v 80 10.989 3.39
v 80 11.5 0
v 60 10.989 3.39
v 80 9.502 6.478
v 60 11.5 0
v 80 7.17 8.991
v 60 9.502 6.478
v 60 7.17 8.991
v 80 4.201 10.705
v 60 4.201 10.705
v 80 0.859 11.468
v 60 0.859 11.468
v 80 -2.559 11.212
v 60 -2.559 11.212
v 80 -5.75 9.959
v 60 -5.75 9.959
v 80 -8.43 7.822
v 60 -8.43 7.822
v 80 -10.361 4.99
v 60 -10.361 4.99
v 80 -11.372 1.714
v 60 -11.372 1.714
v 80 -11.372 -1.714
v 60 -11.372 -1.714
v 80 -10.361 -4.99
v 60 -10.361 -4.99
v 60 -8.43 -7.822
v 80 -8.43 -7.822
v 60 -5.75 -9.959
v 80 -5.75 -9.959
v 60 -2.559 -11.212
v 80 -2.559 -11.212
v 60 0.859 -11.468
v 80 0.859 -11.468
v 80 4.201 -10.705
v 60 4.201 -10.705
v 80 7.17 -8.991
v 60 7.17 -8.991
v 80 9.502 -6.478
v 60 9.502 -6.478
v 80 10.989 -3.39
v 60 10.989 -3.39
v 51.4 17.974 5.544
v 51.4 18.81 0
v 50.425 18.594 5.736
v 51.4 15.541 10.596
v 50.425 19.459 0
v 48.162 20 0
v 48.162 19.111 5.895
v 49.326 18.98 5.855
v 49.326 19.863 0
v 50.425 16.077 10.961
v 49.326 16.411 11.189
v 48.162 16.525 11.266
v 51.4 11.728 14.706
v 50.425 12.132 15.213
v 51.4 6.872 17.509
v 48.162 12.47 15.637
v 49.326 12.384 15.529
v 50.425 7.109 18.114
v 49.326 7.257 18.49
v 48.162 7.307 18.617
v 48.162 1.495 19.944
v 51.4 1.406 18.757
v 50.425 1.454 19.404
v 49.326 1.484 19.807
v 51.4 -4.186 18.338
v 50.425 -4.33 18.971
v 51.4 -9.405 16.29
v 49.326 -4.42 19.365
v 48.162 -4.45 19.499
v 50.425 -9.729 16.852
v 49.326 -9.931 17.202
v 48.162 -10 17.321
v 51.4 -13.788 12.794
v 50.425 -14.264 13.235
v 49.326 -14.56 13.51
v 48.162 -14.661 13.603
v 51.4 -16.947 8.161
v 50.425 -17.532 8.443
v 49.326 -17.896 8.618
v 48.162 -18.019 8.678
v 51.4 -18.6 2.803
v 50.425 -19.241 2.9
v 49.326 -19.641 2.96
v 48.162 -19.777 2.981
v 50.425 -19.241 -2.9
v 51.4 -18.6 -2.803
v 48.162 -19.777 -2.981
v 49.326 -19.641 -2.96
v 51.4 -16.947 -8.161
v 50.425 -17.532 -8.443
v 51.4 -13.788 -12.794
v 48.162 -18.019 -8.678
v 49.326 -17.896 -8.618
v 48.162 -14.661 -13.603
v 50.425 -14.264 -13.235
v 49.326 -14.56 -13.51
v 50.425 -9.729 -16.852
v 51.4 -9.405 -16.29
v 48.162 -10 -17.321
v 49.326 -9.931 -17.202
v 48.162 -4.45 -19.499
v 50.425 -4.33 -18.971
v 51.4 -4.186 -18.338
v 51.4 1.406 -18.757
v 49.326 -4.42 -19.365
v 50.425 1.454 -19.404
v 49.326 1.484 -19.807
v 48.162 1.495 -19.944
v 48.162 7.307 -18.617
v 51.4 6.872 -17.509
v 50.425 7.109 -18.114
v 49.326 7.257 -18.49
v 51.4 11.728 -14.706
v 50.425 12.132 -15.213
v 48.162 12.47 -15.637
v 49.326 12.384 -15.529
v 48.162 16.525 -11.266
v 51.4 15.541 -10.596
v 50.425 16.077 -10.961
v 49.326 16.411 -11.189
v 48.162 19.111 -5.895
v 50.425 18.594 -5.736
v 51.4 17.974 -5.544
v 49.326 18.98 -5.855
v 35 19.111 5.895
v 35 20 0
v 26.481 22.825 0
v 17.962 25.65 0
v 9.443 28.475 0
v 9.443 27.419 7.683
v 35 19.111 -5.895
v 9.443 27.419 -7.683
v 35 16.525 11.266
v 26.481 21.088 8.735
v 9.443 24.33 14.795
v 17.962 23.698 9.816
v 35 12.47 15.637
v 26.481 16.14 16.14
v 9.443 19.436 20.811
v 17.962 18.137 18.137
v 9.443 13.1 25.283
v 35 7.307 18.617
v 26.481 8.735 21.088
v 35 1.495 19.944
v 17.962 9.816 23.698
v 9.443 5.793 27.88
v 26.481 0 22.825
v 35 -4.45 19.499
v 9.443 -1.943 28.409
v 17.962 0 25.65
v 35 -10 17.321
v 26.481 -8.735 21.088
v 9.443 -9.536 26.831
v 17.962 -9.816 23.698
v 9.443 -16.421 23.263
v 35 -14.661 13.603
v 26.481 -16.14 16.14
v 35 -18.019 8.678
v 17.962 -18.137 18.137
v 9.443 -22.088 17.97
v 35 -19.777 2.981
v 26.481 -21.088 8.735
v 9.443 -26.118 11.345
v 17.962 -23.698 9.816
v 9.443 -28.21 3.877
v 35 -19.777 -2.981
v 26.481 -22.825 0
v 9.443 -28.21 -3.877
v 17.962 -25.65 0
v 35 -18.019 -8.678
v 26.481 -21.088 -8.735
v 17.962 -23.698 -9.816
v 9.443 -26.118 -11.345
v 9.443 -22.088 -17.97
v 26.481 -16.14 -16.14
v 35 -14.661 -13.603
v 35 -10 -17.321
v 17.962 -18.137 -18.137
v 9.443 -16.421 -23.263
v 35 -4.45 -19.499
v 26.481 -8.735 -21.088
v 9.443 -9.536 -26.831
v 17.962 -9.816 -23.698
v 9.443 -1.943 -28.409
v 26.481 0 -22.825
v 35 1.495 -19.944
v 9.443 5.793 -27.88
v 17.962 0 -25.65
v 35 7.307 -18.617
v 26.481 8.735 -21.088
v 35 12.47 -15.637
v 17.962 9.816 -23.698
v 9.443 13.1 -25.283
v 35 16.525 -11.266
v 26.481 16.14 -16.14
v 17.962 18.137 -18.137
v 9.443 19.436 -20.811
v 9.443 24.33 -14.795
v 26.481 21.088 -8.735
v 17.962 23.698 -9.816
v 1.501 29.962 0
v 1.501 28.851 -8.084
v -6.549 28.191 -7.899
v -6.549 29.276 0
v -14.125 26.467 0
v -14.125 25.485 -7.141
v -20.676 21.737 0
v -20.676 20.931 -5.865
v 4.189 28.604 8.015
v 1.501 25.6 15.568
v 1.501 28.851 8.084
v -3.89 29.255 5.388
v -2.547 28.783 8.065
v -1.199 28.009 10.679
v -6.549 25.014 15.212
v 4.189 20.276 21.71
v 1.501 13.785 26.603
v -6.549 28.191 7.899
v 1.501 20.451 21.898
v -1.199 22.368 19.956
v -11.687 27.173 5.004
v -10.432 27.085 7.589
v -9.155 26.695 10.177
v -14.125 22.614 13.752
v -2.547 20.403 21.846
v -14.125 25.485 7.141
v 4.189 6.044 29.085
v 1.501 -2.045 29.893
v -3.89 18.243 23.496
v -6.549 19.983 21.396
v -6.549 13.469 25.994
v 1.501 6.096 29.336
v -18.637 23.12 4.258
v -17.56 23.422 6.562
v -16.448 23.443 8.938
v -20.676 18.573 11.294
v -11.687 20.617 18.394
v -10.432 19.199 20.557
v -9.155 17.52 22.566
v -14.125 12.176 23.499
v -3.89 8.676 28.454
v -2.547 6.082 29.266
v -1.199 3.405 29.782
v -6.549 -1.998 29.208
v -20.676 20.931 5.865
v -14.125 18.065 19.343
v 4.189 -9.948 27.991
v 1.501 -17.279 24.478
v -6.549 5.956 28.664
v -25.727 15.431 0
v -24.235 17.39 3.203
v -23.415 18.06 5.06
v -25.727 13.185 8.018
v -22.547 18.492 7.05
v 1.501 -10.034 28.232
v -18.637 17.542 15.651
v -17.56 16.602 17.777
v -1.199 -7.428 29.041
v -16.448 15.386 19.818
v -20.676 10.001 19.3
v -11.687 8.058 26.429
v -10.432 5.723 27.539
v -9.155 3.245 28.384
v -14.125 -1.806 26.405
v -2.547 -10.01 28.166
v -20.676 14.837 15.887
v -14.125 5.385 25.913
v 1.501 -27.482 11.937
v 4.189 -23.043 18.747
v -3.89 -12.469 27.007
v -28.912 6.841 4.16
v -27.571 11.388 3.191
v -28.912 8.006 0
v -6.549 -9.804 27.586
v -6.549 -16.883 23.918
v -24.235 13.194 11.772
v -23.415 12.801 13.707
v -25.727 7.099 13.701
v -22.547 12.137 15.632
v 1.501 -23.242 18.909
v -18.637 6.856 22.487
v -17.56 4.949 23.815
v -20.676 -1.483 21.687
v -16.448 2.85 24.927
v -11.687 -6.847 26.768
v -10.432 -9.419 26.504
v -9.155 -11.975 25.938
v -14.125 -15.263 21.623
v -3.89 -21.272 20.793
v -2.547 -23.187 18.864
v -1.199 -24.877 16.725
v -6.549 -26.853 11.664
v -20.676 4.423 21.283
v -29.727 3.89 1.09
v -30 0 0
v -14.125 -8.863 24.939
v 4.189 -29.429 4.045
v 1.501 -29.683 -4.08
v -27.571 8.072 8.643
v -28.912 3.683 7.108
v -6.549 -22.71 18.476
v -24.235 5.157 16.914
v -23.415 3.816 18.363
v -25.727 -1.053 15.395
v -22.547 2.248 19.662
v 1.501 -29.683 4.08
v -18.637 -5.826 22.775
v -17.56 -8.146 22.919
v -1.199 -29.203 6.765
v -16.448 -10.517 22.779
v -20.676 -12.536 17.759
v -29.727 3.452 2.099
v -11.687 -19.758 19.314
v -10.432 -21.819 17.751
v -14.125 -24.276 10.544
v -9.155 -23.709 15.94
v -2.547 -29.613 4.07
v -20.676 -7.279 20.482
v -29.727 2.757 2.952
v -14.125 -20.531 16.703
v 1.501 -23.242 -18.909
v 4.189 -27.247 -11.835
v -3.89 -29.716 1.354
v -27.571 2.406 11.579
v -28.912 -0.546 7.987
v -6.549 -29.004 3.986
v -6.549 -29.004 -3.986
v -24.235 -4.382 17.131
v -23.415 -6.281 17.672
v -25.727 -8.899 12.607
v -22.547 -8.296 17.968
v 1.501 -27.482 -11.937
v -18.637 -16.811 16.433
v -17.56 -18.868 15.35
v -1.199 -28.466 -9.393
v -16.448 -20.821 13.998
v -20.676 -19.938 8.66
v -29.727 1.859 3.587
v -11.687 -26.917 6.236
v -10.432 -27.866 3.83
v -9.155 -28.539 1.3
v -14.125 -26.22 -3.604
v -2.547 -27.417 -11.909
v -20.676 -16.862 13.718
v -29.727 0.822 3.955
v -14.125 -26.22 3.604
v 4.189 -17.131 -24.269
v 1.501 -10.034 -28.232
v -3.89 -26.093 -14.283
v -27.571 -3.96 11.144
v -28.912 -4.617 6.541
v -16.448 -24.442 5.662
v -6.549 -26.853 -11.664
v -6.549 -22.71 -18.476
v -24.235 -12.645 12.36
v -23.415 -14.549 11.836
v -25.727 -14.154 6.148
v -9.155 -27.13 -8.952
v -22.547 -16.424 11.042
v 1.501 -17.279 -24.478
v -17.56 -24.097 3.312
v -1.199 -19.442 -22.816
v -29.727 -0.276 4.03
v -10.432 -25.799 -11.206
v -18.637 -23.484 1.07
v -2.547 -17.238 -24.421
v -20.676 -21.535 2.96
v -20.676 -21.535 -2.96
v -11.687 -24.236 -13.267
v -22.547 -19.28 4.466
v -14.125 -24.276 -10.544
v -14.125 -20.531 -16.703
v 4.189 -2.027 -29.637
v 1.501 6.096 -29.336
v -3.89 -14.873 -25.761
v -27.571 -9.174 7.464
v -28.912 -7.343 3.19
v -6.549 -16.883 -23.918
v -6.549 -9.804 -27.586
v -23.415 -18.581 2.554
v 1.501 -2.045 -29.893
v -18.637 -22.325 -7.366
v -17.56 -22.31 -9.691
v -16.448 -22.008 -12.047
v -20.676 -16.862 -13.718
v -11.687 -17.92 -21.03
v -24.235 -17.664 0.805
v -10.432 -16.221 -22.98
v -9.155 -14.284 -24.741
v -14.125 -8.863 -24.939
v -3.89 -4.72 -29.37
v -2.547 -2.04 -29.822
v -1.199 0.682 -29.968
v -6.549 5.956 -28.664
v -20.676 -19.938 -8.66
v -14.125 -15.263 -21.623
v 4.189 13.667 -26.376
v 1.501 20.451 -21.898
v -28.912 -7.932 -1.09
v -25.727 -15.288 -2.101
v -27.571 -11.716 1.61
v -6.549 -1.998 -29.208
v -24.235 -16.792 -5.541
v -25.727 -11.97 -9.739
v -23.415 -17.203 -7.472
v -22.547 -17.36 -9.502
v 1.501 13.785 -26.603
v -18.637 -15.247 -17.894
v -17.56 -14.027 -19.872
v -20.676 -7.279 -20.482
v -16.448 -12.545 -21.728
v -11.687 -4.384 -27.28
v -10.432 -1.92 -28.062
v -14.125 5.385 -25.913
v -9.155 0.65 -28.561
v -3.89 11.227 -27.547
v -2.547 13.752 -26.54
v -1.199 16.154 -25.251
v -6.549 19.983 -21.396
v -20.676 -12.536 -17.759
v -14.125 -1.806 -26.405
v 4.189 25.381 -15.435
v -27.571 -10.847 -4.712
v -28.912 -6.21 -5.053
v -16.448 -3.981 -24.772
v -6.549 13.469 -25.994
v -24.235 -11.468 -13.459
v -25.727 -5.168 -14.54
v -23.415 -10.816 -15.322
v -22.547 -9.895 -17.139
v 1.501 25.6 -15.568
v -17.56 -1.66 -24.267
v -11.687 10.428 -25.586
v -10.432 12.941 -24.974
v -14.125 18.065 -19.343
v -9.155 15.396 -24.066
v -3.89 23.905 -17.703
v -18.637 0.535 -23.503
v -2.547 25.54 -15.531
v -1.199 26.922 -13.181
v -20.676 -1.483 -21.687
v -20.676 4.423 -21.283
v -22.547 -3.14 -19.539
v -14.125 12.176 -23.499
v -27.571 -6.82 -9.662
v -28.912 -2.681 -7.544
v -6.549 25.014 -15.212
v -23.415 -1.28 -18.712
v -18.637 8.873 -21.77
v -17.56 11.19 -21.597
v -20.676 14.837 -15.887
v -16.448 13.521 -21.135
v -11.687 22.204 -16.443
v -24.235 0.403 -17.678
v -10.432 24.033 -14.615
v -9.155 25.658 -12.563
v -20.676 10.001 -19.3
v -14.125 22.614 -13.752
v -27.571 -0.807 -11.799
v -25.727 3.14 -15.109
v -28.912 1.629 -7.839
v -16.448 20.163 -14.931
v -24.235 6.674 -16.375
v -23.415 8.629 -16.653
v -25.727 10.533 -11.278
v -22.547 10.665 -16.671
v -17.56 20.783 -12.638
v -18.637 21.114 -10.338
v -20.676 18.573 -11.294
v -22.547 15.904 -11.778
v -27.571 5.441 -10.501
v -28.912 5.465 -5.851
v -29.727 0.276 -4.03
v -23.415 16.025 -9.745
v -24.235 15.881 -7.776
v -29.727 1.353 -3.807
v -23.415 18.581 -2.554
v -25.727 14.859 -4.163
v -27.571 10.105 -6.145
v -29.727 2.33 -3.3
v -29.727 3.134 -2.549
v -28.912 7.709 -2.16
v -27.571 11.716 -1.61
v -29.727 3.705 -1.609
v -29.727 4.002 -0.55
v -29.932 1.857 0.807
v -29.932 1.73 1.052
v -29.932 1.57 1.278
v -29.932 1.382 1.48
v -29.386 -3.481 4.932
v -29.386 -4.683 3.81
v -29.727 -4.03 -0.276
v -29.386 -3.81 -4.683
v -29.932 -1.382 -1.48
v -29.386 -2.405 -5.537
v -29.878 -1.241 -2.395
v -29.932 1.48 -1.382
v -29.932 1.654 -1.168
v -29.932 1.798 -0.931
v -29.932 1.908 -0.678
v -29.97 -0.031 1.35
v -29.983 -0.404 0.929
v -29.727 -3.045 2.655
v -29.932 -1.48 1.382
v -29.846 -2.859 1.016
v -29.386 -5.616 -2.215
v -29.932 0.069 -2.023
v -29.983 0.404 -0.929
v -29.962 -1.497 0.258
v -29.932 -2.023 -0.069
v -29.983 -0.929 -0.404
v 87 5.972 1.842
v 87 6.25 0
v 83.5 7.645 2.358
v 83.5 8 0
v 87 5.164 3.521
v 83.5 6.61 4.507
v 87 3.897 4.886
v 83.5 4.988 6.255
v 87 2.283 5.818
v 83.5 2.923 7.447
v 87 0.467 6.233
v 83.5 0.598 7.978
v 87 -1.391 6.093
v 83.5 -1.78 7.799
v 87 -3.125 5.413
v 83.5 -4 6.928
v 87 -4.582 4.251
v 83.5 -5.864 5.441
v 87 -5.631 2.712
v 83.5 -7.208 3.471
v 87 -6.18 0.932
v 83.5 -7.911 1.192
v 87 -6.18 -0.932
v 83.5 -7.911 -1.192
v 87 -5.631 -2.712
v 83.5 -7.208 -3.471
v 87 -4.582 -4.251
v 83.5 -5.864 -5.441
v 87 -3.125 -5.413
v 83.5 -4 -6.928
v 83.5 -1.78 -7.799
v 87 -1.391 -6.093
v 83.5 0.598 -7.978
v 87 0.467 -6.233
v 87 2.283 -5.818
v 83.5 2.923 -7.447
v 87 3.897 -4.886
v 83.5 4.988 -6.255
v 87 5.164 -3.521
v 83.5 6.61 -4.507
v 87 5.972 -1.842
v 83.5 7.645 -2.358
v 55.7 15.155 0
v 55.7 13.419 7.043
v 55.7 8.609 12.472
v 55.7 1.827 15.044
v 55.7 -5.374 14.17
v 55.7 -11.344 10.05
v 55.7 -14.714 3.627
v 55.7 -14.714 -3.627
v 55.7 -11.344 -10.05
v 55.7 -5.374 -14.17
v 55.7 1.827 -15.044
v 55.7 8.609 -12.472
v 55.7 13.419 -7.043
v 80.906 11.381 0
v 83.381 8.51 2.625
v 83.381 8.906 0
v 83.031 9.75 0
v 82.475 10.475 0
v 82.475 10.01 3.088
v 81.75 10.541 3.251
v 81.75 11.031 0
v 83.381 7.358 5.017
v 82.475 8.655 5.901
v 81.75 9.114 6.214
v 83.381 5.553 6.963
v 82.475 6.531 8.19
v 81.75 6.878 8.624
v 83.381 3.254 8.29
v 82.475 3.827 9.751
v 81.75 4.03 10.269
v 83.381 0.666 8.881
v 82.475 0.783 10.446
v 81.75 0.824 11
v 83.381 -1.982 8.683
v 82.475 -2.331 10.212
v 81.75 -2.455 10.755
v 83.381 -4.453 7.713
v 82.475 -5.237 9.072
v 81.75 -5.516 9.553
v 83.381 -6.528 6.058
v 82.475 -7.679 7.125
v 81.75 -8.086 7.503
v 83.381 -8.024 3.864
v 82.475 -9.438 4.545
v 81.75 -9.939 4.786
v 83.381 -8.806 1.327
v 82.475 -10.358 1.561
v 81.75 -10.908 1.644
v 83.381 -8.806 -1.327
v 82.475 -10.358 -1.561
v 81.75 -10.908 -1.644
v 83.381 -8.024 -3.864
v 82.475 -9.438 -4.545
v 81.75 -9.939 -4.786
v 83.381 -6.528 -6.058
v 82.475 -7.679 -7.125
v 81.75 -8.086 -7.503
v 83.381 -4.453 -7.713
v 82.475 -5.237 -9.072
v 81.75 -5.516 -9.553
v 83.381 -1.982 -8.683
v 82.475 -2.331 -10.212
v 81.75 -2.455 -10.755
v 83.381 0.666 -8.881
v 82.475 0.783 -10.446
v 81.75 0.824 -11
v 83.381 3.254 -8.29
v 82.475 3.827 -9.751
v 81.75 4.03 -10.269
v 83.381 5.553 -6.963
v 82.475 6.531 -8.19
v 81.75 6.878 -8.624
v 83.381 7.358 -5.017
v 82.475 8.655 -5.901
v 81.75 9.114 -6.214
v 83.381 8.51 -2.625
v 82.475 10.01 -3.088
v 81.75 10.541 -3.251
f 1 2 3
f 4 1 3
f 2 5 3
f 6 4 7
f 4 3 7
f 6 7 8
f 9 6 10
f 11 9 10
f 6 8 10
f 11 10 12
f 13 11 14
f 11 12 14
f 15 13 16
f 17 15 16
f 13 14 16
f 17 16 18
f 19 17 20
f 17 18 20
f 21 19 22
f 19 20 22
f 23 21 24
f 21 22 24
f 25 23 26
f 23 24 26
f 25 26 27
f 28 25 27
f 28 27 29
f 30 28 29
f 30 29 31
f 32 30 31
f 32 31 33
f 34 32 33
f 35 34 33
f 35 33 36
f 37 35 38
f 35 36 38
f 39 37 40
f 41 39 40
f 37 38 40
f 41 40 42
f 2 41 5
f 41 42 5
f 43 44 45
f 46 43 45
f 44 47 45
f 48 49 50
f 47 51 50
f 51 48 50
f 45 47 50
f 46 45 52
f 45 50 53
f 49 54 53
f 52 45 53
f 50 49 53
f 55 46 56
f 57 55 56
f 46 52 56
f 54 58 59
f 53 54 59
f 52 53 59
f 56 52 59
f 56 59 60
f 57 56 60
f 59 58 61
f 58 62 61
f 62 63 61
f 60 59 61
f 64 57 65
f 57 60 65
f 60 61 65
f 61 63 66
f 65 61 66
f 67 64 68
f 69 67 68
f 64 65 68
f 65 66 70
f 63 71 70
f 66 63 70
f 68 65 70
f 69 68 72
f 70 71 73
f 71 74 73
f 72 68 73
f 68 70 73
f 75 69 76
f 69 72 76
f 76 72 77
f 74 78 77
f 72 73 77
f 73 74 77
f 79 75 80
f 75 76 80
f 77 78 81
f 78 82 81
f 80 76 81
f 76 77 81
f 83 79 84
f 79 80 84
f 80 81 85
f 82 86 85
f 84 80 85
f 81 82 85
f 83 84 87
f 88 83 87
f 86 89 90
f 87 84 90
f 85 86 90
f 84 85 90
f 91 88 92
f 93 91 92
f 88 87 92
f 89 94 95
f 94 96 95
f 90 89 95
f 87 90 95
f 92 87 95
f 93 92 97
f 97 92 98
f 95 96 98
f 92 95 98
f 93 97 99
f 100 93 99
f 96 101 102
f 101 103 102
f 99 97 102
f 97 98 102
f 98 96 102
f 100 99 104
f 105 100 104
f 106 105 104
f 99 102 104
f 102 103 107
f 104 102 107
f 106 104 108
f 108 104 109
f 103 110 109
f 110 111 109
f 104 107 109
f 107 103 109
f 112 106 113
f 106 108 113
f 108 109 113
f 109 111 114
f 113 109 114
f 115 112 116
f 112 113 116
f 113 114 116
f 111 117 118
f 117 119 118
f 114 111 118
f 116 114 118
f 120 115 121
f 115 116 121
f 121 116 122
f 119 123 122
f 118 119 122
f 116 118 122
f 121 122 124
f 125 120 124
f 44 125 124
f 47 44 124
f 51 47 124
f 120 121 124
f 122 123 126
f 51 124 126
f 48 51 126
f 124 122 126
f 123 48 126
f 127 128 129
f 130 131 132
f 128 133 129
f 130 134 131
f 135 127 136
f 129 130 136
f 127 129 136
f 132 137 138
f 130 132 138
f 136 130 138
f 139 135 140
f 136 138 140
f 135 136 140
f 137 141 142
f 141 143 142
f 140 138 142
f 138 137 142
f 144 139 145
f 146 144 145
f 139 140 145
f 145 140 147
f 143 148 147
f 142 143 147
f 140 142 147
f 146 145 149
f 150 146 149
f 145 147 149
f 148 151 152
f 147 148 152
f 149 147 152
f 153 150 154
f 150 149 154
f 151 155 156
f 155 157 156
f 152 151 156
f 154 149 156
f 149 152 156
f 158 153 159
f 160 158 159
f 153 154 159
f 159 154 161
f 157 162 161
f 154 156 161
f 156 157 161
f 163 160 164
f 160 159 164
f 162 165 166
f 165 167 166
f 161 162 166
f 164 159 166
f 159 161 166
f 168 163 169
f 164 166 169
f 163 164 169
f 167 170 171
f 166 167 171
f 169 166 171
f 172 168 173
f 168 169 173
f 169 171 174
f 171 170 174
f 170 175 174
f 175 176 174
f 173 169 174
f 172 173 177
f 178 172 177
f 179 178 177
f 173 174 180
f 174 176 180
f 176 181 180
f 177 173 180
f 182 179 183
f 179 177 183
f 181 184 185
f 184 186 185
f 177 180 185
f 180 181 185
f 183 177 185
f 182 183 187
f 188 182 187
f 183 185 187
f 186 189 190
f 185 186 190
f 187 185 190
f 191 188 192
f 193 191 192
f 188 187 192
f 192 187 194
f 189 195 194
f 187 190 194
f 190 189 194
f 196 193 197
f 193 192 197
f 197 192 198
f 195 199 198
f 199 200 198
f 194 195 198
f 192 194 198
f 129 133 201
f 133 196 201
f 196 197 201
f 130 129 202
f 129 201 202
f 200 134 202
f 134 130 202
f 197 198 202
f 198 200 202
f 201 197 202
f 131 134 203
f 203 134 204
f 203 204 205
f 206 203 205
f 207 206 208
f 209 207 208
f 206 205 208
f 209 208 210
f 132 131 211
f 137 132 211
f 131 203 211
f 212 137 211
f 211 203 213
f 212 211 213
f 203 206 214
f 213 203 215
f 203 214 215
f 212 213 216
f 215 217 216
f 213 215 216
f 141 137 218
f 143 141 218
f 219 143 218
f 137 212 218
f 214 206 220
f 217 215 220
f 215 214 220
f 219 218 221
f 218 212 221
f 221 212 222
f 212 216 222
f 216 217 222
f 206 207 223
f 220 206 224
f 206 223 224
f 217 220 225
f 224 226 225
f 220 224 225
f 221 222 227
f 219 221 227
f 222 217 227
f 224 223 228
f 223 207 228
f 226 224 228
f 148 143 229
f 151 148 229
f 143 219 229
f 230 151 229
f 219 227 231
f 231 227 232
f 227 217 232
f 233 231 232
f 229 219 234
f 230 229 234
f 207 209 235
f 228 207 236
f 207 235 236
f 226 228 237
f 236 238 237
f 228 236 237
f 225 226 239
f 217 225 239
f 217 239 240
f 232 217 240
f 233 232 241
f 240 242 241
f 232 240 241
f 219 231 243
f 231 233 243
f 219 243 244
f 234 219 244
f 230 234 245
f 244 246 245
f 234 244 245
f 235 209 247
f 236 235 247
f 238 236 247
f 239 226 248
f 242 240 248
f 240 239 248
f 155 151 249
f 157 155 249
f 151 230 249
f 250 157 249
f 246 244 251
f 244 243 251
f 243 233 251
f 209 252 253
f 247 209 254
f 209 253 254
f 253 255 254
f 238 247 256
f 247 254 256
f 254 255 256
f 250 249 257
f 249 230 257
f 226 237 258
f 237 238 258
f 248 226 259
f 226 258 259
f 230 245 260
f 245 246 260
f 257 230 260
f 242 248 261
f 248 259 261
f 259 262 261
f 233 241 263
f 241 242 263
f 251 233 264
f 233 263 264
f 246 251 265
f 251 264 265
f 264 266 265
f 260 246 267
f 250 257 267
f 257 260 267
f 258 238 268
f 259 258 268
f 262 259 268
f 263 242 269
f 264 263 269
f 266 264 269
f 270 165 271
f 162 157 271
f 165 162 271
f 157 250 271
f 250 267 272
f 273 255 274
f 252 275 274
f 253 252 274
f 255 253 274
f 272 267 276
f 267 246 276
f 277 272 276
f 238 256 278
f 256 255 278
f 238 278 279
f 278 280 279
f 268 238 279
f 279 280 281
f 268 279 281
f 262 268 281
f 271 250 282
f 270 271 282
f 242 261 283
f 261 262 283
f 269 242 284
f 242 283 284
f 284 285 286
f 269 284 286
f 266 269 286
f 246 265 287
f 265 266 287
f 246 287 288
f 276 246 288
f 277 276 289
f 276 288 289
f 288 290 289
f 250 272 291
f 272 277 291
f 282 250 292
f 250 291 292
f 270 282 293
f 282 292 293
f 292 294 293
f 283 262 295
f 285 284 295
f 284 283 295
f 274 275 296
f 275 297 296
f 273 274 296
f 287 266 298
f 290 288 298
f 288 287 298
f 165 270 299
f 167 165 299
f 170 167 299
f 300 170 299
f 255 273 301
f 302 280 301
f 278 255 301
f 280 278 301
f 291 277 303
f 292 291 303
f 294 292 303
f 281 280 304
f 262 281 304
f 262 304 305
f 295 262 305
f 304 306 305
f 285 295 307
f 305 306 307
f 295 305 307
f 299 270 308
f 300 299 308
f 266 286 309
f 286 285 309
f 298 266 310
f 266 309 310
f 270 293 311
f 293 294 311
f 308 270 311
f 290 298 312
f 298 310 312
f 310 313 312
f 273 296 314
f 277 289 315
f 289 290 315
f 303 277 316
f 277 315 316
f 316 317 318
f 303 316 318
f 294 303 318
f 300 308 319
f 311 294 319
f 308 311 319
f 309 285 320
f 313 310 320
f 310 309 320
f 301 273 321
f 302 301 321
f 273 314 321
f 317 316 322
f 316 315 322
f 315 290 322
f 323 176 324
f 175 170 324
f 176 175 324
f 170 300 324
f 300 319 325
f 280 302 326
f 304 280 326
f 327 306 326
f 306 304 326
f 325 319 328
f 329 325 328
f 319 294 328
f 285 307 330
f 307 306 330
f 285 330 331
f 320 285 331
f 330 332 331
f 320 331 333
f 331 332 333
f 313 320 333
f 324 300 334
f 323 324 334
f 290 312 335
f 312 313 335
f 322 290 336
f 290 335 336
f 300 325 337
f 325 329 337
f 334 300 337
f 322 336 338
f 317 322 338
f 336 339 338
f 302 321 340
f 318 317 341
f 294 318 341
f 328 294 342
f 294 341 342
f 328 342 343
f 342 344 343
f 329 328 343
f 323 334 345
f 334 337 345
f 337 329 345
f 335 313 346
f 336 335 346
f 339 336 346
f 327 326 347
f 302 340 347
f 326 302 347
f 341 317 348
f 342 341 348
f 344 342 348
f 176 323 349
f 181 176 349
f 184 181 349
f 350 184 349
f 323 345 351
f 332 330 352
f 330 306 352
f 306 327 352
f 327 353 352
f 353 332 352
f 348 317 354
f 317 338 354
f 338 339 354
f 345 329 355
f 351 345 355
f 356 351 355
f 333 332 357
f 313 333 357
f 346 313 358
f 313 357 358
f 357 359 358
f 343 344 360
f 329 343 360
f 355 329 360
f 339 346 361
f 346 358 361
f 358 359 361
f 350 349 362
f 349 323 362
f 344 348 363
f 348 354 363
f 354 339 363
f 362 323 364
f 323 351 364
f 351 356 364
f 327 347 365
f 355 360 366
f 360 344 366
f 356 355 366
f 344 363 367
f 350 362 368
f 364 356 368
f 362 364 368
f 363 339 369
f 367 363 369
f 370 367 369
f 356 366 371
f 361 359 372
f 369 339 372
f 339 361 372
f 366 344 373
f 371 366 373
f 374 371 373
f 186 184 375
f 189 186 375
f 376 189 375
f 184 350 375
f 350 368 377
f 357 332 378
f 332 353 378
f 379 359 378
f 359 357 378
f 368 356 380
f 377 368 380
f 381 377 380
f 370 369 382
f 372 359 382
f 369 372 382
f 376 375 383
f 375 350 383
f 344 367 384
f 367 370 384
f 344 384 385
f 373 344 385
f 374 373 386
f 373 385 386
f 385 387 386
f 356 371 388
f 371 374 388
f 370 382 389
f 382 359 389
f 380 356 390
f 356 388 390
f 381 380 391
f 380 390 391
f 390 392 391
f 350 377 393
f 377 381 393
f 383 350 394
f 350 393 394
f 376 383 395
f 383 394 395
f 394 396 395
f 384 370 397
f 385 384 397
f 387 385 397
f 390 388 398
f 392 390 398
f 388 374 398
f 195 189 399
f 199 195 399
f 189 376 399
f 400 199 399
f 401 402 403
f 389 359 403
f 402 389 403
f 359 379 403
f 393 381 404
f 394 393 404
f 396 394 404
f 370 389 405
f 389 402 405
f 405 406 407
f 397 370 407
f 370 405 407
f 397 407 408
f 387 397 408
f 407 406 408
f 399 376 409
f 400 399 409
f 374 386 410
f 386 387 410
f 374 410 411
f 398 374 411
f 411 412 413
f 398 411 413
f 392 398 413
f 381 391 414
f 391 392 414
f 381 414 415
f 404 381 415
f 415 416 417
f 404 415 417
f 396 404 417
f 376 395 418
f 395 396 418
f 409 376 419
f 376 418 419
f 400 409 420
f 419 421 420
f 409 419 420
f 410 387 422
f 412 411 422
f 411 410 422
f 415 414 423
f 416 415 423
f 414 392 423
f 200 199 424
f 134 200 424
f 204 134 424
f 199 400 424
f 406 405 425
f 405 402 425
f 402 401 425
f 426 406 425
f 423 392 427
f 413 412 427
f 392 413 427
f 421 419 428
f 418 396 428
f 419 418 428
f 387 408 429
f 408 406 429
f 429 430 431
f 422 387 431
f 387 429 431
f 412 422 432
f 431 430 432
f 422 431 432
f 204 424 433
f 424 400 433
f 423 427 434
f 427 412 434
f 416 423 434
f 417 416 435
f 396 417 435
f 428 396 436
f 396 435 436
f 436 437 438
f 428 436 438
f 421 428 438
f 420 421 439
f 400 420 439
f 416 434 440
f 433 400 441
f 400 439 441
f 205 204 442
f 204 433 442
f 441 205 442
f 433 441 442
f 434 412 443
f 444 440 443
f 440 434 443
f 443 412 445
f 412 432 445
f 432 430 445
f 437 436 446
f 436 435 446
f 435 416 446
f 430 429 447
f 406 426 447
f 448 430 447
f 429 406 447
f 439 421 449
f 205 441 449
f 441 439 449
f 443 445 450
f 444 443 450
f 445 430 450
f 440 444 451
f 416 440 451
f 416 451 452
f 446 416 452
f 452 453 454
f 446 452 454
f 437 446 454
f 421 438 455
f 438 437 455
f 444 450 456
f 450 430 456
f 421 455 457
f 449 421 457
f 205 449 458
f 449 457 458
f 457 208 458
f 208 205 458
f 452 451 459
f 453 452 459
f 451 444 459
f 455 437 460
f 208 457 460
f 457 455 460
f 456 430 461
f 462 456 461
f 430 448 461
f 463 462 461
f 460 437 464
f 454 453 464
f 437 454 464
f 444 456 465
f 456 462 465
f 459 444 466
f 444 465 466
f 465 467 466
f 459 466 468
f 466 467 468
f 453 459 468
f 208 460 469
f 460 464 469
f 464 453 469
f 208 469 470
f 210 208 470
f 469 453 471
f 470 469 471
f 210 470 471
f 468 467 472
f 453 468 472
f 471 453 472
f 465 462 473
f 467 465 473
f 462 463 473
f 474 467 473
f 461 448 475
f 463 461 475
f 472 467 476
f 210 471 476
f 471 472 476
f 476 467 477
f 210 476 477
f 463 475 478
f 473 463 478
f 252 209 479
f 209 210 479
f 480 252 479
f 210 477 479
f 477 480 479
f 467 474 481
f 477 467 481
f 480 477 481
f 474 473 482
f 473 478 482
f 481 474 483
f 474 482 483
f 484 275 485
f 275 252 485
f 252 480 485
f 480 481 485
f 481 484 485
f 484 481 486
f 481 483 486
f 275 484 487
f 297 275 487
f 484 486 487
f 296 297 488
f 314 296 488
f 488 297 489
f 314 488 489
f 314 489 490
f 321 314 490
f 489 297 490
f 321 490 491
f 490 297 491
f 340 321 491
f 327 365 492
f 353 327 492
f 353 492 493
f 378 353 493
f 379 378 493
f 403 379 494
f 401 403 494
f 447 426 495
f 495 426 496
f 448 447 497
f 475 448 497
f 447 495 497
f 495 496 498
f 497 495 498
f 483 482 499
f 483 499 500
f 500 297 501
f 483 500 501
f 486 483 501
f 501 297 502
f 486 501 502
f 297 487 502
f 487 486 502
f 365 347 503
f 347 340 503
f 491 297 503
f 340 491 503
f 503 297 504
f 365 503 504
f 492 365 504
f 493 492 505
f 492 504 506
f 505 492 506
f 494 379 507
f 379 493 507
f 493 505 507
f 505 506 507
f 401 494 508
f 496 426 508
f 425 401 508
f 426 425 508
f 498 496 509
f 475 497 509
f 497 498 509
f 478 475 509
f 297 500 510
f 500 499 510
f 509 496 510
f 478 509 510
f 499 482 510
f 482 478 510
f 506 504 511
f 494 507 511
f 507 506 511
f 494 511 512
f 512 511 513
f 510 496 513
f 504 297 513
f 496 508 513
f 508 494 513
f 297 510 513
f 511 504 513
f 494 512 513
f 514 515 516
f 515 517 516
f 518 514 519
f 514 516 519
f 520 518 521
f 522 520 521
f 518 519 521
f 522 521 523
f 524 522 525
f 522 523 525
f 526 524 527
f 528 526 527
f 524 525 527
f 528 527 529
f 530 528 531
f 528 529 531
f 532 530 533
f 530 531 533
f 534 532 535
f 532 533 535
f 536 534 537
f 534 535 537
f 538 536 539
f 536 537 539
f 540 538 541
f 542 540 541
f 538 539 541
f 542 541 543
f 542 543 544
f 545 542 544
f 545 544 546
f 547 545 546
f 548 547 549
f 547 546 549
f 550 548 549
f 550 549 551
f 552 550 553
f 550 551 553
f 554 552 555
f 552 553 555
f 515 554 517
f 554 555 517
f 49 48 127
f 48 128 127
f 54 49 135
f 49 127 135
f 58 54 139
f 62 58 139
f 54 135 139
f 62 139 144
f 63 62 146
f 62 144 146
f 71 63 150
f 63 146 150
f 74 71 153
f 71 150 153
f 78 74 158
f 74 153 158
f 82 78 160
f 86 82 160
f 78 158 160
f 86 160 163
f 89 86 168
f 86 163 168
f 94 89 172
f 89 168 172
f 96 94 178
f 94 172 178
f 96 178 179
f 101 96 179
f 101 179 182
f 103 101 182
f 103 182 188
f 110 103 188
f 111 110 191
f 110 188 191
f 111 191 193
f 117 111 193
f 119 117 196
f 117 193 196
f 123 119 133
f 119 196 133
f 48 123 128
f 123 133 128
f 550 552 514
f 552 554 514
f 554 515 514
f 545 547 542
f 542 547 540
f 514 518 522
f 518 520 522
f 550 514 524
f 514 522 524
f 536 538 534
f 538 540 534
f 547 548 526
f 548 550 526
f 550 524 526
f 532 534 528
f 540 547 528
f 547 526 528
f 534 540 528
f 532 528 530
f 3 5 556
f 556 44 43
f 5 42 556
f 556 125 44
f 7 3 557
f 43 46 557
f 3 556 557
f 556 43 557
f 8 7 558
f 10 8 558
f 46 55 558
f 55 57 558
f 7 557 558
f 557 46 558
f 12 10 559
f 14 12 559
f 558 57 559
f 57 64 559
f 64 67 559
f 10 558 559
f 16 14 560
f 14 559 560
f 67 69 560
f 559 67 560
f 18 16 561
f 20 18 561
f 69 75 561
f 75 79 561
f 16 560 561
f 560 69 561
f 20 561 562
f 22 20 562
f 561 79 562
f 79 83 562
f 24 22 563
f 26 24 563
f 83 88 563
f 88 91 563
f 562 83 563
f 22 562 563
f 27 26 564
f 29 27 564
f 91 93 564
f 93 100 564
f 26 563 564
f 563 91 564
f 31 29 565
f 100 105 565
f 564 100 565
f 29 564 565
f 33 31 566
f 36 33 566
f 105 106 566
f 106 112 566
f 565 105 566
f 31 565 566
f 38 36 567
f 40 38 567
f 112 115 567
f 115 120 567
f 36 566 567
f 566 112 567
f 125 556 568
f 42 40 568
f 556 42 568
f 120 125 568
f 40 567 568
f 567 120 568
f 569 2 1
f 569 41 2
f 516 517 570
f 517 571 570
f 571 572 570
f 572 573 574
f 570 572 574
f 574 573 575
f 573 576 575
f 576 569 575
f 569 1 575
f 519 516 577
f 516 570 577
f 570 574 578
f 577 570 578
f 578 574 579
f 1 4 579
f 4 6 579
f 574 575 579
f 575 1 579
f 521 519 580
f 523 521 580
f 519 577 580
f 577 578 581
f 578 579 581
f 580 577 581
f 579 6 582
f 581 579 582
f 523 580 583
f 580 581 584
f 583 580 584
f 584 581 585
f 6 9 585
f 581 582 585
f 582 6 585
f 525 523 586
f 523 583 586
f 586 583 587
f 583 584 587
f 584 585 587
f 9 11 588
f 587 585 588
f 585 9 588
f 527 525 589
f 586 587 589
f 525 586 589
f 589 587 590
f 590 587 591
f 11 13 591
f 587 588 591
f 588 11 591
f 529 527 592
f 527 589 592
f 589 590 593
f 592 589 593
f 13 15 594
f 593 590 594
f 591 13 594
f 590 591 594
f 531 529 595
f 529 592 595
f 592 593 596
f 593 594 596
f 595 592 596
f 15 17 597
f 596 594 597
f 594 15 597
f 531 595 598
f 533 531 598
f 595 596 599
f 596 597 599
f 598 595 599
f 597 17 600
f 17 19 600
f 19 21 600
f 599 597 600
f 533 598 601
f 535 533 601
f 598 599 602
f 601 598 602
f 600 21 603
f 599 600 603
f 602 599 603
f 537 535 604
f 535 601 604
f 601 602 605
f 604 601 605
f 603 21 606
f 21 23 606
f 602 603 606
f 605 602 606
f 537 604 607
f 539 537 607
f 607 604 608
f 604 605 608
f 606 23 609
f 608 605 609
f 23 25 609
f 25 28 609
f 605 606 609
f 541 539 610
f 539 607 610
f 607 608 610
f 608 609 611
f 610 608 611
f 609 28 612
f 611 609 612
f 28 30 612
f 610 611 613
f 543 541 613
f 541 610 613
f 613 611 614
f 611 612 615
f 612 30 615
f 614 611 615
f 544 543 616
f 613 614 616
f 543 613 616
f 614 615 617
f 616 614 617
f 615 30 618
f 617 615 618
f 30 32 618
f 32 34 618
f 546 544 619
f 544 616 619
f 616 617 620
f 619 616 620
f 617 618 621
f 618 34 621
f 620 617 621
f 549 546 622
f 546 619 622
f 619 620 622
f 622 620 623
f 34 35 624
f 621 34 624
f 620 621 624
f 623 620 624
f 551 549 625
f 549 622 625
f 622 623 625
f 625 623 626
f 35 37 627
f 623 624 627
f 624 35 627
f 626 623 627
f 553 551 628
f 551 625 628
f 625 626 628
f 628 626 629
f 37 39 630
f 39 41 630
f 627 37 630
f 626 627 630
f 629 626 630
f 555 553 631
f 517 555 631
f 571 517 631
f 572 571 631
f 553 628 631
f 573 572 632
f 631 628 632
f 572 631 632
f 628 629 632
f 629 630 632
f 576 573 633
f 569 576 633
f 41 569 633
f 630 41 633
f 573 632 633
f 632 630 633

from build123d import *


with BuildPart() as f1:
    # F0 (on Top) → F1 (revolve)
    with BuildSketch(Plane.XY):
        with BuildLine():
            Line((48.162115, 20), (35, 20))
            Line((35, 20), (9.442773, 28.475148))
            ThreePointArc((9.442773, 28.475148), (-17.560137, 24.323684), (-30, 0))
            Line((-30, 0), (87, 0))
            Line((87, 0), (87, 6.25))
            Line((87, 6.25), (83.5, 8))
            ThreePointArc((83.5, 8), (82.474874, 10.474874), (80, 11.5))
            Line((80, 11.5), (60, 11.5))
            Line((60, 11.5), (51.400357, 18.809697))
            ThreePointArc((51.400357, 18.809697), (49.887154, 19.692999), (48.162115, 20))
        make_face()
    revolve(axis=Axis((17.5, 0, 0), (1, 0, 0)))


solid = f1.part
